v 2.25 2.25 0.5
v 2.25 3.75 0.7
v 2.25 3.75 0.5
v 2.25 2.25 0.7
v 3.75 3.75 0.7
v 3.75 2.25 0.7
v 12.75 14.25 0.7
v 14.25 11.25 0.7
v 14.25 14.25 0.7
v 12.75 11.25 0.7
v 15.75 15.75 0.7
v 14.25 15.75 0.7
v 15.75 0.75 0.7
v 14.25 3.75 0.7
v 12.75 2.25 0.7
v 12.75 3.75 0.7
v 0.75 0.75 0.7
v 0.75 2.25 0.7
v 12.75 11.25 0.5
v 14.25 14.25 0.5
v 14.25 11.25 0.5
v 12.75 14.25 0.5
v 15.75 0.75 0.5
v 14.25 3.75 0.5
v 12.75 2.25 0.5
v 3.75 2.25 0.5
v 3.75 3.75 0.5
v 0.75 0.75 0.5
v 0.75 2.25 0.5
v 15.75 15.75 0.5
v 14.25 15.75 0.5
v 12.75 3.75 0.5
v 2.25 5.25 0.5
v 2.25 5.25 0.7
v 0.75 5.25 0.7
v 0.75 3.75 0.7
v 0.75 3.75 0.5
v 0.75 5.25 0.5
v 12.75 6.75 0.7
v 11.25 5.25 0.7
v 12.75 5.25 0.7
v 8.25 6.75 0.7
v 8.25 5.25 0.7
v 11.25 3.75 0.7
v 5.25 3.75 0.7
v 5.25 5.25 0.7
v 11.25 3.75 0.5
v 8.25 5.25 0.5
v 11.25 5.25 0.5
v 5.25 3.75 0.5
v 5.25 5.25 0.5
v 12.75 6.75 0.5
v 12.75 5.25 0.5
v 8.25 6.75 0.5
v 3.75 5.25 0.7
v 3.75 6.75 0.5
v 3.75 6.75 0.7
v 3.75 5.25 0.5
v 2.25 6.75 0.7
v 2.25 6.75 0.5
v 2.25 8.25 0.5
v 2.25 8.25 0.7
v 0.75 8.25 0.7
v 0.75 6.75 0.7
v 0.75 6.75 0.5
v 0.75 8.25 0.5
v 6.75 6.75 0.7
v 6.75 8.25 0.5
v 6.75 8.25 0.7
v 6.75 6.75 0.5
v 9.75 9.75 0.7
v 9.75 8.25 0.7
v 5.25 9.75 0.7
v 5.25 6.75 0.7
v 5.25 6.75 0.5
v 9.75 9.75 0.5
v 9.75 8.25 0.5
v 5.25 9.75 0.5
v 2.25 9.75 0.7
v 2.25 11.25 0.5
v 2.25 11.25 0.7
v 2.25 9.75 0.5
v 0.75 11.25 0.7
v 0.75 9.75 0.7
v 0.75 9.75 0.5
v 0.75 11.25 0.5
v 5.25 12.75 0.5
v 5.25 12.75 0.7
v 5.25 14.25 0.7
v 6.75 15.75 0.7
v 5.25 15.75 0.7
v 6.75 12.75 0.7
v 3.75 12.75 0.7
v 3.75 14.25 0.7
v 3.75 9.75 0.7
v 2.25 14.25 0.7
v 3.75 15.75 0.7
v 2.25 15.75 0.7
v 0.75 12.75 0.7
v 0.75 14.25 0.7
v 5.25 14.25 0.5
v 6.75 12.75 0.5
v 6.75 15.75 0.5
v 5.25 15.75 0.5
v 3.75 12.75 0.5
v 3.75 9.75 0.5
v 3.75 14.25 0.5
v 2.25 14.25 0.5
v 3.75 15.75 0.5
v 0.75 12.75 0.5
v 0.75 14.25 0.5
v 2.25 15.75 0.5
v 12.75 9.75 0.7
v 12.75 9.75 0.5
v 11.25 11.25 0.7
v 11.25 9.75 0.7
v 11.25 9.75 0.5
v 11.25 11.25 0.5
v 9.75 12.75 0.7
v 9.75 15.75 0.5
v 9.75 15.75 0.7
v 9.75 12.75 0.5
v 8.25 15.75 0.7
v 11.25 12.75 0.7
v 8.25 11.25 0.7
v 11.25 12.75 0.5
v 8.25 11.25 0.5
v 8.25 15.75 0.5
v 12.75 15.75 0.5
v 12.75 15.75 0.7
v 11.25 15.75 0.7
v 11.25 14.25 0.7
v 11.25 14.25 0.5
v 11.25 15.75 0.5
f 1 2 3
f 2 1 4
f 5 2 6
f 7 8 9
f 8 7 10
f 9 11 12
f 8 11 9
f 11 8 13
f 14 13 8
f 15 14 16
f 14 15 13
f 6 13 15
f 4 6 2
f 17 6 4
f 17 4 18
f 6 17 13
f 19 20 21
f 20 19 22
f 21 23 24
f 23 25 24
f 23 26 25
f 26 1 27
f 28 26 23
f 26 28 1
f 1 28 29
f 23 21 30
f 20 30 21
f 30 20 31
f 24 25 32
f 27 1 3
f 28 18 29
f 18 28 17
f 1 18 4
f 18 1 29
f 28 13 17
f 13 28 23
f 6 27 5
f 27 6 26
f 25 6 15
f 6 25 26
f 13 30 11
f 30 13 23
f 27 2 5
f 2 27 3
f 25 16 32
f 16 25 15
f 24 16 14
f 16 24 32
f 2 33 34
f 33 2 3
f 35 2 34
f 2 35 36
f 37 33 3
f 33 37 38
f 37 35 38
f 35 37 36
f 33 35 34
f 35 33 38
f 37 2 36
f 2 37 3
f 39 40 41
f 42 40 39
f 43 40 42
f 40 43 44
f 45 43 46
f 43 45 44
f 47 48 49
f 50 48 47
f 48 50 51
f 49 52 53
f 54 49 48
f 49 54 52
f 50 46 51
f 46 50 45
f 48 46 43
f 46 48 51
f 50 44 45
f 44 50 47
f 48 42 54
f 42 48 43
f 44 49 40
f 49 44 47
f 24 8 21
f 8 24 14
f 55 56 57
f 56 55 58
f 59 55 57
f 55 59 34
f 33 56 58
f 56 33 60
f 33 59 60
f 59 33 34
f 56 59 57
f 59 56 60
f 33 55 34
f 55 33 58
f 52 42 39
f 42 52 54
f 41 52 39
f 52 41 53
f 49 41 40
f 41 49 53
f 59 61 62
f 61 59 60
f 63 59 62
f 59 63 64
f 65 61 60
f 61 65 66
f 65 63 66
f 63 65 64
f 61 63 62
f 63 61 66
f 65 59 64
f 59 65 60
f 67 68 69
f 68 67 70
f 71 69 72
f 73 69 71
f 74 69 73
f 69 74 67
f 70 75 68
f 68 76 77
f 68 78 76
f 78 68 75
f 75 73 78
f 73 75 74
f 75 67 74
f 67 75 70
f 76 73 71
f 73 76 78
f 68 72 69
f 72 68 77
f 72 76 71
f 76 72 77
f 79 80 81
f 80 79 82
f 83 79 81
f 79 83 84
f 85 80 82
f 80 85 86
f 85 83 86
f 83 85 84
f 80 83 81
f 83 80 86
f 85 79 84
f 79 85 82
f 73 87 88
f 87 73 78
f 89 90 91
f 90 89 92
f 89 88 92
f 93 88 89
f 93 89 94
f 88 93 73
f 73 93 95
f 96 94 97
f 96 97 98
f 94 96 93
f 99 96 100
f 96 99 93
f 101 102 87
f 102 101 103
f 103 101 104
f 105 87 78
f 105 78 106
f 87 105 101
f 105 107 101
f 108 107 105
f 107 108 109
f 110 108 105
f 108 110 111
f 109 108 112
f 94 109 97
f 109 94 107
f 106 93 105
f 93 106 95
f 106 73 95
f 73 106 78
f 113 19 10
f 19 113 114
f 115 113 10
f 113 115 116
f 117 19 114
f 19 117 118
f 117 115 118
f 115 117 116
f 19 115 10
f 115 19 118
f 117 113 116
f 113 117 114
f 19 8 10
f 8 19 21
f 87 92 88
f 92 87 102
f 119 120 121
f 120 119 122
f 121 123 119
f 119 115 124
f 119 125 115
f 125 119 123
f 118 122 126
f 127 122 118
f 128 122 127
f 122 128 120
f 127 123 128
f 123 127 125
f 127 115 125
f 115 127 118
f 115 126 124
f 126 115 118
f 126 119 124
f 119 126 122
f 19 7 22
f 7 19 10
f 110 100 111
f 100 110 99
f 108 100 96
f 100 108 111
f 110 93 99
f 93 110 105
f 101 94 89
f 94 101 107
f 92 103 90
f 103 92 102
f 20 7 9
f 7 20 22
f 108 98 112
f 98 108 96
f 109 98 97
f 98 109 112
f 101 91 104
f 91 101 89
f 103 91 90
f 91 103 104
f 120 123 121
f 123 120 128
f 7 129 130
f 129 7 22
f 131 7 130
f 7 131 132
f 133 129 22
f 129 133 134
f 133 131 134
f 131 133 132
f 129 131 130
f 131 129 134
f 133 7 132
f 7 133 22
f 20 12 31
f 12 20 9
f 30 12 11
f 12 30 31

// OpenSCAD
rotate([0,0,0])translate([0,0,0.6]){
translate([1.5,1.5,0])  cube(size = [1.5,1.5,0.2], center=true);
translate([3,1.5,0])  cube(size = [1.5,1.5,0.2], center=true);
translate([4.5,1.5,0])  cube(size = [1.5,1.5,0.2], center=true);
translate([6,1.5,0])  cube(size = [1.5,1.5,0.2], center=true);
translate([7.5,1.5,0])  cube(size = [1.5,1.5,0.2], center=true);
translate([9,1.5,0])  cube(size = [1.5,1.5,0.2], center=true);
translate([10.5,1.5,0])  cube(size = [1.5,1.5,0.2], center=true);
translate([12,1.5,0])  cube(size = [1.5,1.5,0.2], center=true);
translate([13.5,1.5,0])  cube(size = [1.5,1.5,0.2], center=true);
translate([15,1.5,0])  cube(size = [1.5,1.5,0.2], center=true);
translate([15,1.5,0])  cube(size = [1.5,1.5,0.2], center=true);
translate([3,3,0])  cube(size = [1.5,1.5,0.2], center=true);
translate([3,3,0])  cube(size = [1.5,1.5,0.2], center=true);
translate([3,3,0])  cube(size = [1.5,1.5,0.2], center=true);
translate([3,3,0])  cube(size = [1.5,1.5,0.2], center=true);
translate([3,3,0])  cube(size = [1.5,1.5,0.2], center=true);
translate([3,3,0])  cube(size = [1.5,1.5,0.2], center=true);
translate([3,3,0])  cube(size = [1.5,1.5,0.2], center=true);
translate([13.5,3,0])  cube(size = [1.5,1.5,0.2], center=true);
translate([15,3,0])  cube(size = [1.5,1.5,0.2], center=true);
translate([1.5,4.5,0])  cube(size = [1.5,1.5,0.2], center=true);
translate([1.5,4.5,0])  cube(size = [1.5,1.5,0.2], center=true);
translate([1.5,4.5,0])  cube(size = [1.5,1.5,0.2], center=true);
translate([6,4.5,0])  cube(size = [1.5,1.5,0.2], center=true);
translate([7.5,4.5,0])  cube(size = [1.5,1.5,0.2], center=true);
translate([9,4.5,0])  cube(size = [1.5,1.5,0.2], center=true);
translate([10.5,4.5,0])  cube(size = [1.5,1.5,0.2], center=true);
translate([10.5,4.5,0])  cube(size = [1.5,1.5,0.2], center=true);
translate([10.5,4.5,0])  cube(size = [1.5,1.5,0.2], center=true);
translate([15,4.5,0])  cube(size = [1.5,1.5,0.2], center=true);
translate([15,4.5,0])  cube(size = [1.5,1.5,0.2], center=true);
translate([3,6,0])  cube(size = [1.5,1.5,0.2], center=true);
translate([3,6,0])  cube(size = [1.5,1.5,0.2], center=true);
translate([3,6,0])  cube(size = [1.5,1.5,0.2], center=true);
translate([3,6,0])  cube(size = [1.5,1.5,0.2], center=true);
translate([9,6,0])  cube(size = [1.5,1.5,0.2], center=true);
translate([10.5,6,0])  cube(size = [1.5,1.5,0.2], center=true);
translate([12,6,0])  cube(size = [1.5,1.5,0.2], center=true);
translate([12,6,0])  cube(size = [1.5,1.5,0.2], center=true);
translate([15,6,0])  cube(size = [1.5,1.5,0.2], center=true);
translate([1.5,7.5,0])  cube(size = [1.5,1.5,0.2], center=true);
translate([1.5,7.5,0])  cube(size = [1.5,1.5,0.2], center=true);
translate([1.5,7.5,0])  cube(size = [1.5,1.5,0.2], center=true);
translate([6,7.5,0])  cube(size = [1.5,1.5,0.2], center=true);
translate([6,7.5,0])  cube(size = [1.5,1.5,0.2], center=true);
translate([6,7.5,0])  cube(size = [1.5,1.5,0.2], center=true);
translate([6,7.5,0])  cube(size = [1.5,1.5,0.2], center=true);
translate([6,7.5,0])  cube(size = [1.5,1.5,0.2], center=true);
translate([6,7.5,0])  cube(size = [1.5,1.5,0.2], center=true);
translate([15,7.5,0])  cube(size = [1.5,1.5,0.2], center=true);
translate([15,7.5,0])  cube(size = [1.5,1.5,0.2], center=true);
translate([15,7.5,0])  cube(size = [1.5,1.5,0.2], center=true);
translate([15,7.5,0])  cube(size = [1.5,1.5,0.2], center=true);
translate([6,9,0])  cube(size = [1.5,1.5,0.2], center=true);
translate([7.5,9,0])  cube(size = [1.5,1.5,0.2], center=true);
translate([9,9,0])  cube(size = [1.5,1.5,0.2], center=true);
translate([9,9,0])  cube(size = [1.5,1.5,0.2], center=true);
translate([9,9,0])  cube(size = [1.5,1.5,0.2], center=true);
translate([9,9,0])  cube(size = [1.5,1.5,0.2], center=true);
translate([15,9,0])  cube(size = [1.5,1.5,0.2], center=true);
translate([1.5,10.5,0])  cube(size = [1.5,1.5,0.2], center=true);
translate([1.5,10.5,0])  cube(size = [1.5,1.5,0.2], center=true);
translate([4.5,10.5,0])  cube(size = [1.5,1.5,0.2], center=true);
translate([4.5,10.5,0])  cube(size = [1.5,1.5,0.2], center=true);
translate([4.5,10.5,0])  cube(size = [1.5,1.5,0.2], center=true);
translate([4.5,10.5,0])  cube(size = [1.5,1.5,0.2], center=true);
translate([4.5,10.5,0])  cube(size = [1.5,1.5,0.2], center=true);
translate([12,10.5,0])  cube(size = [1.5,1.5,0.2], center=true);
translate([12,10.5,0])  cube(size = [1.5,1.5,0.2], center=true);
translate([15,10.5,0])  cube(size = [1.5,1.5,0.2], center=true);
translate([15,10.5,0])  cube(size = [1.5,1.5,0.2], center=true);
translate([15,10.5,0])  cube(size = [1.5,1.5,0.2], center=true);
translate([4.5,12,0])  cube(size = [1.5,1.5,0.2], center=true);
translate([4.5,12,0])  cube(size = [1.5,1.5,0.2], center=true);
translate([4.5,12,0])  cube(size = [1.5,1.5,0.2], center=true);
translate([9,12,0])  cube(size = [1.5,1.5,0.2], center=true);
translate([10.5,12,0])  cube(size = [1.5,1.5,0.2], center=true);
translate([10.5,12,0])  cube(size = [1.5,1.5,0.2], center=true);
translate([13.5,12,0])  cube(size = [1.5,1.5,0.2], center=true);
translate([15,12,0])  cube(size = [1.5,1.5,0.2], center=true);
translate([1.5,13.5,0])  cube(size = [1.5,1.5,0.2], center=true);
translate([3,13.5,0])  cube(size = [1.5,1.5,0.2], center=true);
translate([4.5,13.5,0])  cube(size = [1.5,1.5,0.2], center=true);
translate([6,13.5,0])  cube(size = [1.5,1.5,0.2], center=true);
translate([6,13.5,0])  cube(size = [1.5,1.5,0.2], center=true);
translate([9,13.5,0])  cube(size = [1.5,1.5,0.2], center=true);
translate([9,13.5,0])  cube(size = [1.5,1.5,0.2], center=true);
translate([9,13.5,0])  cube(size = [1.5,1.5,0.2], center=true);
translate([13.5,13.5,0])  cube(size = [1.5,1.5,0.2], center=true);
translate([15,13.5,0])  cube(size = [1.5,1.5,0.2], center=true);
translate([15,13.5,0])  cube(size = [1.5,1.5,0.2], center=true);
translate([3,15,0])  cube(size = [1.5,1.5,0.2], center=true);
translate([3,15,0])  cube(size = [1.5,1.5,0.2], center=true);
translate([6,15,0])  cube(size = [1.5,1.5,0.2], center=true);
translate([6,15,0])  cube(size = [1.5,1.5,0.2], center=true);
translate([9,15,0])  cube(size = [1.5,1.5,0.2], center=true);
translate([9,15,0])  cube(size = [1.5,1.5,0.2], center=true);
translate([12,15,0])  cube(size = [1.5,1.5,0.2], center=true);
translate([12,15,0])  cube(size = [1.5,1.5,0.2], center=true);
translate([15,15,0])  cube(size = [1.5,1.5,0.2], center=true);
}
